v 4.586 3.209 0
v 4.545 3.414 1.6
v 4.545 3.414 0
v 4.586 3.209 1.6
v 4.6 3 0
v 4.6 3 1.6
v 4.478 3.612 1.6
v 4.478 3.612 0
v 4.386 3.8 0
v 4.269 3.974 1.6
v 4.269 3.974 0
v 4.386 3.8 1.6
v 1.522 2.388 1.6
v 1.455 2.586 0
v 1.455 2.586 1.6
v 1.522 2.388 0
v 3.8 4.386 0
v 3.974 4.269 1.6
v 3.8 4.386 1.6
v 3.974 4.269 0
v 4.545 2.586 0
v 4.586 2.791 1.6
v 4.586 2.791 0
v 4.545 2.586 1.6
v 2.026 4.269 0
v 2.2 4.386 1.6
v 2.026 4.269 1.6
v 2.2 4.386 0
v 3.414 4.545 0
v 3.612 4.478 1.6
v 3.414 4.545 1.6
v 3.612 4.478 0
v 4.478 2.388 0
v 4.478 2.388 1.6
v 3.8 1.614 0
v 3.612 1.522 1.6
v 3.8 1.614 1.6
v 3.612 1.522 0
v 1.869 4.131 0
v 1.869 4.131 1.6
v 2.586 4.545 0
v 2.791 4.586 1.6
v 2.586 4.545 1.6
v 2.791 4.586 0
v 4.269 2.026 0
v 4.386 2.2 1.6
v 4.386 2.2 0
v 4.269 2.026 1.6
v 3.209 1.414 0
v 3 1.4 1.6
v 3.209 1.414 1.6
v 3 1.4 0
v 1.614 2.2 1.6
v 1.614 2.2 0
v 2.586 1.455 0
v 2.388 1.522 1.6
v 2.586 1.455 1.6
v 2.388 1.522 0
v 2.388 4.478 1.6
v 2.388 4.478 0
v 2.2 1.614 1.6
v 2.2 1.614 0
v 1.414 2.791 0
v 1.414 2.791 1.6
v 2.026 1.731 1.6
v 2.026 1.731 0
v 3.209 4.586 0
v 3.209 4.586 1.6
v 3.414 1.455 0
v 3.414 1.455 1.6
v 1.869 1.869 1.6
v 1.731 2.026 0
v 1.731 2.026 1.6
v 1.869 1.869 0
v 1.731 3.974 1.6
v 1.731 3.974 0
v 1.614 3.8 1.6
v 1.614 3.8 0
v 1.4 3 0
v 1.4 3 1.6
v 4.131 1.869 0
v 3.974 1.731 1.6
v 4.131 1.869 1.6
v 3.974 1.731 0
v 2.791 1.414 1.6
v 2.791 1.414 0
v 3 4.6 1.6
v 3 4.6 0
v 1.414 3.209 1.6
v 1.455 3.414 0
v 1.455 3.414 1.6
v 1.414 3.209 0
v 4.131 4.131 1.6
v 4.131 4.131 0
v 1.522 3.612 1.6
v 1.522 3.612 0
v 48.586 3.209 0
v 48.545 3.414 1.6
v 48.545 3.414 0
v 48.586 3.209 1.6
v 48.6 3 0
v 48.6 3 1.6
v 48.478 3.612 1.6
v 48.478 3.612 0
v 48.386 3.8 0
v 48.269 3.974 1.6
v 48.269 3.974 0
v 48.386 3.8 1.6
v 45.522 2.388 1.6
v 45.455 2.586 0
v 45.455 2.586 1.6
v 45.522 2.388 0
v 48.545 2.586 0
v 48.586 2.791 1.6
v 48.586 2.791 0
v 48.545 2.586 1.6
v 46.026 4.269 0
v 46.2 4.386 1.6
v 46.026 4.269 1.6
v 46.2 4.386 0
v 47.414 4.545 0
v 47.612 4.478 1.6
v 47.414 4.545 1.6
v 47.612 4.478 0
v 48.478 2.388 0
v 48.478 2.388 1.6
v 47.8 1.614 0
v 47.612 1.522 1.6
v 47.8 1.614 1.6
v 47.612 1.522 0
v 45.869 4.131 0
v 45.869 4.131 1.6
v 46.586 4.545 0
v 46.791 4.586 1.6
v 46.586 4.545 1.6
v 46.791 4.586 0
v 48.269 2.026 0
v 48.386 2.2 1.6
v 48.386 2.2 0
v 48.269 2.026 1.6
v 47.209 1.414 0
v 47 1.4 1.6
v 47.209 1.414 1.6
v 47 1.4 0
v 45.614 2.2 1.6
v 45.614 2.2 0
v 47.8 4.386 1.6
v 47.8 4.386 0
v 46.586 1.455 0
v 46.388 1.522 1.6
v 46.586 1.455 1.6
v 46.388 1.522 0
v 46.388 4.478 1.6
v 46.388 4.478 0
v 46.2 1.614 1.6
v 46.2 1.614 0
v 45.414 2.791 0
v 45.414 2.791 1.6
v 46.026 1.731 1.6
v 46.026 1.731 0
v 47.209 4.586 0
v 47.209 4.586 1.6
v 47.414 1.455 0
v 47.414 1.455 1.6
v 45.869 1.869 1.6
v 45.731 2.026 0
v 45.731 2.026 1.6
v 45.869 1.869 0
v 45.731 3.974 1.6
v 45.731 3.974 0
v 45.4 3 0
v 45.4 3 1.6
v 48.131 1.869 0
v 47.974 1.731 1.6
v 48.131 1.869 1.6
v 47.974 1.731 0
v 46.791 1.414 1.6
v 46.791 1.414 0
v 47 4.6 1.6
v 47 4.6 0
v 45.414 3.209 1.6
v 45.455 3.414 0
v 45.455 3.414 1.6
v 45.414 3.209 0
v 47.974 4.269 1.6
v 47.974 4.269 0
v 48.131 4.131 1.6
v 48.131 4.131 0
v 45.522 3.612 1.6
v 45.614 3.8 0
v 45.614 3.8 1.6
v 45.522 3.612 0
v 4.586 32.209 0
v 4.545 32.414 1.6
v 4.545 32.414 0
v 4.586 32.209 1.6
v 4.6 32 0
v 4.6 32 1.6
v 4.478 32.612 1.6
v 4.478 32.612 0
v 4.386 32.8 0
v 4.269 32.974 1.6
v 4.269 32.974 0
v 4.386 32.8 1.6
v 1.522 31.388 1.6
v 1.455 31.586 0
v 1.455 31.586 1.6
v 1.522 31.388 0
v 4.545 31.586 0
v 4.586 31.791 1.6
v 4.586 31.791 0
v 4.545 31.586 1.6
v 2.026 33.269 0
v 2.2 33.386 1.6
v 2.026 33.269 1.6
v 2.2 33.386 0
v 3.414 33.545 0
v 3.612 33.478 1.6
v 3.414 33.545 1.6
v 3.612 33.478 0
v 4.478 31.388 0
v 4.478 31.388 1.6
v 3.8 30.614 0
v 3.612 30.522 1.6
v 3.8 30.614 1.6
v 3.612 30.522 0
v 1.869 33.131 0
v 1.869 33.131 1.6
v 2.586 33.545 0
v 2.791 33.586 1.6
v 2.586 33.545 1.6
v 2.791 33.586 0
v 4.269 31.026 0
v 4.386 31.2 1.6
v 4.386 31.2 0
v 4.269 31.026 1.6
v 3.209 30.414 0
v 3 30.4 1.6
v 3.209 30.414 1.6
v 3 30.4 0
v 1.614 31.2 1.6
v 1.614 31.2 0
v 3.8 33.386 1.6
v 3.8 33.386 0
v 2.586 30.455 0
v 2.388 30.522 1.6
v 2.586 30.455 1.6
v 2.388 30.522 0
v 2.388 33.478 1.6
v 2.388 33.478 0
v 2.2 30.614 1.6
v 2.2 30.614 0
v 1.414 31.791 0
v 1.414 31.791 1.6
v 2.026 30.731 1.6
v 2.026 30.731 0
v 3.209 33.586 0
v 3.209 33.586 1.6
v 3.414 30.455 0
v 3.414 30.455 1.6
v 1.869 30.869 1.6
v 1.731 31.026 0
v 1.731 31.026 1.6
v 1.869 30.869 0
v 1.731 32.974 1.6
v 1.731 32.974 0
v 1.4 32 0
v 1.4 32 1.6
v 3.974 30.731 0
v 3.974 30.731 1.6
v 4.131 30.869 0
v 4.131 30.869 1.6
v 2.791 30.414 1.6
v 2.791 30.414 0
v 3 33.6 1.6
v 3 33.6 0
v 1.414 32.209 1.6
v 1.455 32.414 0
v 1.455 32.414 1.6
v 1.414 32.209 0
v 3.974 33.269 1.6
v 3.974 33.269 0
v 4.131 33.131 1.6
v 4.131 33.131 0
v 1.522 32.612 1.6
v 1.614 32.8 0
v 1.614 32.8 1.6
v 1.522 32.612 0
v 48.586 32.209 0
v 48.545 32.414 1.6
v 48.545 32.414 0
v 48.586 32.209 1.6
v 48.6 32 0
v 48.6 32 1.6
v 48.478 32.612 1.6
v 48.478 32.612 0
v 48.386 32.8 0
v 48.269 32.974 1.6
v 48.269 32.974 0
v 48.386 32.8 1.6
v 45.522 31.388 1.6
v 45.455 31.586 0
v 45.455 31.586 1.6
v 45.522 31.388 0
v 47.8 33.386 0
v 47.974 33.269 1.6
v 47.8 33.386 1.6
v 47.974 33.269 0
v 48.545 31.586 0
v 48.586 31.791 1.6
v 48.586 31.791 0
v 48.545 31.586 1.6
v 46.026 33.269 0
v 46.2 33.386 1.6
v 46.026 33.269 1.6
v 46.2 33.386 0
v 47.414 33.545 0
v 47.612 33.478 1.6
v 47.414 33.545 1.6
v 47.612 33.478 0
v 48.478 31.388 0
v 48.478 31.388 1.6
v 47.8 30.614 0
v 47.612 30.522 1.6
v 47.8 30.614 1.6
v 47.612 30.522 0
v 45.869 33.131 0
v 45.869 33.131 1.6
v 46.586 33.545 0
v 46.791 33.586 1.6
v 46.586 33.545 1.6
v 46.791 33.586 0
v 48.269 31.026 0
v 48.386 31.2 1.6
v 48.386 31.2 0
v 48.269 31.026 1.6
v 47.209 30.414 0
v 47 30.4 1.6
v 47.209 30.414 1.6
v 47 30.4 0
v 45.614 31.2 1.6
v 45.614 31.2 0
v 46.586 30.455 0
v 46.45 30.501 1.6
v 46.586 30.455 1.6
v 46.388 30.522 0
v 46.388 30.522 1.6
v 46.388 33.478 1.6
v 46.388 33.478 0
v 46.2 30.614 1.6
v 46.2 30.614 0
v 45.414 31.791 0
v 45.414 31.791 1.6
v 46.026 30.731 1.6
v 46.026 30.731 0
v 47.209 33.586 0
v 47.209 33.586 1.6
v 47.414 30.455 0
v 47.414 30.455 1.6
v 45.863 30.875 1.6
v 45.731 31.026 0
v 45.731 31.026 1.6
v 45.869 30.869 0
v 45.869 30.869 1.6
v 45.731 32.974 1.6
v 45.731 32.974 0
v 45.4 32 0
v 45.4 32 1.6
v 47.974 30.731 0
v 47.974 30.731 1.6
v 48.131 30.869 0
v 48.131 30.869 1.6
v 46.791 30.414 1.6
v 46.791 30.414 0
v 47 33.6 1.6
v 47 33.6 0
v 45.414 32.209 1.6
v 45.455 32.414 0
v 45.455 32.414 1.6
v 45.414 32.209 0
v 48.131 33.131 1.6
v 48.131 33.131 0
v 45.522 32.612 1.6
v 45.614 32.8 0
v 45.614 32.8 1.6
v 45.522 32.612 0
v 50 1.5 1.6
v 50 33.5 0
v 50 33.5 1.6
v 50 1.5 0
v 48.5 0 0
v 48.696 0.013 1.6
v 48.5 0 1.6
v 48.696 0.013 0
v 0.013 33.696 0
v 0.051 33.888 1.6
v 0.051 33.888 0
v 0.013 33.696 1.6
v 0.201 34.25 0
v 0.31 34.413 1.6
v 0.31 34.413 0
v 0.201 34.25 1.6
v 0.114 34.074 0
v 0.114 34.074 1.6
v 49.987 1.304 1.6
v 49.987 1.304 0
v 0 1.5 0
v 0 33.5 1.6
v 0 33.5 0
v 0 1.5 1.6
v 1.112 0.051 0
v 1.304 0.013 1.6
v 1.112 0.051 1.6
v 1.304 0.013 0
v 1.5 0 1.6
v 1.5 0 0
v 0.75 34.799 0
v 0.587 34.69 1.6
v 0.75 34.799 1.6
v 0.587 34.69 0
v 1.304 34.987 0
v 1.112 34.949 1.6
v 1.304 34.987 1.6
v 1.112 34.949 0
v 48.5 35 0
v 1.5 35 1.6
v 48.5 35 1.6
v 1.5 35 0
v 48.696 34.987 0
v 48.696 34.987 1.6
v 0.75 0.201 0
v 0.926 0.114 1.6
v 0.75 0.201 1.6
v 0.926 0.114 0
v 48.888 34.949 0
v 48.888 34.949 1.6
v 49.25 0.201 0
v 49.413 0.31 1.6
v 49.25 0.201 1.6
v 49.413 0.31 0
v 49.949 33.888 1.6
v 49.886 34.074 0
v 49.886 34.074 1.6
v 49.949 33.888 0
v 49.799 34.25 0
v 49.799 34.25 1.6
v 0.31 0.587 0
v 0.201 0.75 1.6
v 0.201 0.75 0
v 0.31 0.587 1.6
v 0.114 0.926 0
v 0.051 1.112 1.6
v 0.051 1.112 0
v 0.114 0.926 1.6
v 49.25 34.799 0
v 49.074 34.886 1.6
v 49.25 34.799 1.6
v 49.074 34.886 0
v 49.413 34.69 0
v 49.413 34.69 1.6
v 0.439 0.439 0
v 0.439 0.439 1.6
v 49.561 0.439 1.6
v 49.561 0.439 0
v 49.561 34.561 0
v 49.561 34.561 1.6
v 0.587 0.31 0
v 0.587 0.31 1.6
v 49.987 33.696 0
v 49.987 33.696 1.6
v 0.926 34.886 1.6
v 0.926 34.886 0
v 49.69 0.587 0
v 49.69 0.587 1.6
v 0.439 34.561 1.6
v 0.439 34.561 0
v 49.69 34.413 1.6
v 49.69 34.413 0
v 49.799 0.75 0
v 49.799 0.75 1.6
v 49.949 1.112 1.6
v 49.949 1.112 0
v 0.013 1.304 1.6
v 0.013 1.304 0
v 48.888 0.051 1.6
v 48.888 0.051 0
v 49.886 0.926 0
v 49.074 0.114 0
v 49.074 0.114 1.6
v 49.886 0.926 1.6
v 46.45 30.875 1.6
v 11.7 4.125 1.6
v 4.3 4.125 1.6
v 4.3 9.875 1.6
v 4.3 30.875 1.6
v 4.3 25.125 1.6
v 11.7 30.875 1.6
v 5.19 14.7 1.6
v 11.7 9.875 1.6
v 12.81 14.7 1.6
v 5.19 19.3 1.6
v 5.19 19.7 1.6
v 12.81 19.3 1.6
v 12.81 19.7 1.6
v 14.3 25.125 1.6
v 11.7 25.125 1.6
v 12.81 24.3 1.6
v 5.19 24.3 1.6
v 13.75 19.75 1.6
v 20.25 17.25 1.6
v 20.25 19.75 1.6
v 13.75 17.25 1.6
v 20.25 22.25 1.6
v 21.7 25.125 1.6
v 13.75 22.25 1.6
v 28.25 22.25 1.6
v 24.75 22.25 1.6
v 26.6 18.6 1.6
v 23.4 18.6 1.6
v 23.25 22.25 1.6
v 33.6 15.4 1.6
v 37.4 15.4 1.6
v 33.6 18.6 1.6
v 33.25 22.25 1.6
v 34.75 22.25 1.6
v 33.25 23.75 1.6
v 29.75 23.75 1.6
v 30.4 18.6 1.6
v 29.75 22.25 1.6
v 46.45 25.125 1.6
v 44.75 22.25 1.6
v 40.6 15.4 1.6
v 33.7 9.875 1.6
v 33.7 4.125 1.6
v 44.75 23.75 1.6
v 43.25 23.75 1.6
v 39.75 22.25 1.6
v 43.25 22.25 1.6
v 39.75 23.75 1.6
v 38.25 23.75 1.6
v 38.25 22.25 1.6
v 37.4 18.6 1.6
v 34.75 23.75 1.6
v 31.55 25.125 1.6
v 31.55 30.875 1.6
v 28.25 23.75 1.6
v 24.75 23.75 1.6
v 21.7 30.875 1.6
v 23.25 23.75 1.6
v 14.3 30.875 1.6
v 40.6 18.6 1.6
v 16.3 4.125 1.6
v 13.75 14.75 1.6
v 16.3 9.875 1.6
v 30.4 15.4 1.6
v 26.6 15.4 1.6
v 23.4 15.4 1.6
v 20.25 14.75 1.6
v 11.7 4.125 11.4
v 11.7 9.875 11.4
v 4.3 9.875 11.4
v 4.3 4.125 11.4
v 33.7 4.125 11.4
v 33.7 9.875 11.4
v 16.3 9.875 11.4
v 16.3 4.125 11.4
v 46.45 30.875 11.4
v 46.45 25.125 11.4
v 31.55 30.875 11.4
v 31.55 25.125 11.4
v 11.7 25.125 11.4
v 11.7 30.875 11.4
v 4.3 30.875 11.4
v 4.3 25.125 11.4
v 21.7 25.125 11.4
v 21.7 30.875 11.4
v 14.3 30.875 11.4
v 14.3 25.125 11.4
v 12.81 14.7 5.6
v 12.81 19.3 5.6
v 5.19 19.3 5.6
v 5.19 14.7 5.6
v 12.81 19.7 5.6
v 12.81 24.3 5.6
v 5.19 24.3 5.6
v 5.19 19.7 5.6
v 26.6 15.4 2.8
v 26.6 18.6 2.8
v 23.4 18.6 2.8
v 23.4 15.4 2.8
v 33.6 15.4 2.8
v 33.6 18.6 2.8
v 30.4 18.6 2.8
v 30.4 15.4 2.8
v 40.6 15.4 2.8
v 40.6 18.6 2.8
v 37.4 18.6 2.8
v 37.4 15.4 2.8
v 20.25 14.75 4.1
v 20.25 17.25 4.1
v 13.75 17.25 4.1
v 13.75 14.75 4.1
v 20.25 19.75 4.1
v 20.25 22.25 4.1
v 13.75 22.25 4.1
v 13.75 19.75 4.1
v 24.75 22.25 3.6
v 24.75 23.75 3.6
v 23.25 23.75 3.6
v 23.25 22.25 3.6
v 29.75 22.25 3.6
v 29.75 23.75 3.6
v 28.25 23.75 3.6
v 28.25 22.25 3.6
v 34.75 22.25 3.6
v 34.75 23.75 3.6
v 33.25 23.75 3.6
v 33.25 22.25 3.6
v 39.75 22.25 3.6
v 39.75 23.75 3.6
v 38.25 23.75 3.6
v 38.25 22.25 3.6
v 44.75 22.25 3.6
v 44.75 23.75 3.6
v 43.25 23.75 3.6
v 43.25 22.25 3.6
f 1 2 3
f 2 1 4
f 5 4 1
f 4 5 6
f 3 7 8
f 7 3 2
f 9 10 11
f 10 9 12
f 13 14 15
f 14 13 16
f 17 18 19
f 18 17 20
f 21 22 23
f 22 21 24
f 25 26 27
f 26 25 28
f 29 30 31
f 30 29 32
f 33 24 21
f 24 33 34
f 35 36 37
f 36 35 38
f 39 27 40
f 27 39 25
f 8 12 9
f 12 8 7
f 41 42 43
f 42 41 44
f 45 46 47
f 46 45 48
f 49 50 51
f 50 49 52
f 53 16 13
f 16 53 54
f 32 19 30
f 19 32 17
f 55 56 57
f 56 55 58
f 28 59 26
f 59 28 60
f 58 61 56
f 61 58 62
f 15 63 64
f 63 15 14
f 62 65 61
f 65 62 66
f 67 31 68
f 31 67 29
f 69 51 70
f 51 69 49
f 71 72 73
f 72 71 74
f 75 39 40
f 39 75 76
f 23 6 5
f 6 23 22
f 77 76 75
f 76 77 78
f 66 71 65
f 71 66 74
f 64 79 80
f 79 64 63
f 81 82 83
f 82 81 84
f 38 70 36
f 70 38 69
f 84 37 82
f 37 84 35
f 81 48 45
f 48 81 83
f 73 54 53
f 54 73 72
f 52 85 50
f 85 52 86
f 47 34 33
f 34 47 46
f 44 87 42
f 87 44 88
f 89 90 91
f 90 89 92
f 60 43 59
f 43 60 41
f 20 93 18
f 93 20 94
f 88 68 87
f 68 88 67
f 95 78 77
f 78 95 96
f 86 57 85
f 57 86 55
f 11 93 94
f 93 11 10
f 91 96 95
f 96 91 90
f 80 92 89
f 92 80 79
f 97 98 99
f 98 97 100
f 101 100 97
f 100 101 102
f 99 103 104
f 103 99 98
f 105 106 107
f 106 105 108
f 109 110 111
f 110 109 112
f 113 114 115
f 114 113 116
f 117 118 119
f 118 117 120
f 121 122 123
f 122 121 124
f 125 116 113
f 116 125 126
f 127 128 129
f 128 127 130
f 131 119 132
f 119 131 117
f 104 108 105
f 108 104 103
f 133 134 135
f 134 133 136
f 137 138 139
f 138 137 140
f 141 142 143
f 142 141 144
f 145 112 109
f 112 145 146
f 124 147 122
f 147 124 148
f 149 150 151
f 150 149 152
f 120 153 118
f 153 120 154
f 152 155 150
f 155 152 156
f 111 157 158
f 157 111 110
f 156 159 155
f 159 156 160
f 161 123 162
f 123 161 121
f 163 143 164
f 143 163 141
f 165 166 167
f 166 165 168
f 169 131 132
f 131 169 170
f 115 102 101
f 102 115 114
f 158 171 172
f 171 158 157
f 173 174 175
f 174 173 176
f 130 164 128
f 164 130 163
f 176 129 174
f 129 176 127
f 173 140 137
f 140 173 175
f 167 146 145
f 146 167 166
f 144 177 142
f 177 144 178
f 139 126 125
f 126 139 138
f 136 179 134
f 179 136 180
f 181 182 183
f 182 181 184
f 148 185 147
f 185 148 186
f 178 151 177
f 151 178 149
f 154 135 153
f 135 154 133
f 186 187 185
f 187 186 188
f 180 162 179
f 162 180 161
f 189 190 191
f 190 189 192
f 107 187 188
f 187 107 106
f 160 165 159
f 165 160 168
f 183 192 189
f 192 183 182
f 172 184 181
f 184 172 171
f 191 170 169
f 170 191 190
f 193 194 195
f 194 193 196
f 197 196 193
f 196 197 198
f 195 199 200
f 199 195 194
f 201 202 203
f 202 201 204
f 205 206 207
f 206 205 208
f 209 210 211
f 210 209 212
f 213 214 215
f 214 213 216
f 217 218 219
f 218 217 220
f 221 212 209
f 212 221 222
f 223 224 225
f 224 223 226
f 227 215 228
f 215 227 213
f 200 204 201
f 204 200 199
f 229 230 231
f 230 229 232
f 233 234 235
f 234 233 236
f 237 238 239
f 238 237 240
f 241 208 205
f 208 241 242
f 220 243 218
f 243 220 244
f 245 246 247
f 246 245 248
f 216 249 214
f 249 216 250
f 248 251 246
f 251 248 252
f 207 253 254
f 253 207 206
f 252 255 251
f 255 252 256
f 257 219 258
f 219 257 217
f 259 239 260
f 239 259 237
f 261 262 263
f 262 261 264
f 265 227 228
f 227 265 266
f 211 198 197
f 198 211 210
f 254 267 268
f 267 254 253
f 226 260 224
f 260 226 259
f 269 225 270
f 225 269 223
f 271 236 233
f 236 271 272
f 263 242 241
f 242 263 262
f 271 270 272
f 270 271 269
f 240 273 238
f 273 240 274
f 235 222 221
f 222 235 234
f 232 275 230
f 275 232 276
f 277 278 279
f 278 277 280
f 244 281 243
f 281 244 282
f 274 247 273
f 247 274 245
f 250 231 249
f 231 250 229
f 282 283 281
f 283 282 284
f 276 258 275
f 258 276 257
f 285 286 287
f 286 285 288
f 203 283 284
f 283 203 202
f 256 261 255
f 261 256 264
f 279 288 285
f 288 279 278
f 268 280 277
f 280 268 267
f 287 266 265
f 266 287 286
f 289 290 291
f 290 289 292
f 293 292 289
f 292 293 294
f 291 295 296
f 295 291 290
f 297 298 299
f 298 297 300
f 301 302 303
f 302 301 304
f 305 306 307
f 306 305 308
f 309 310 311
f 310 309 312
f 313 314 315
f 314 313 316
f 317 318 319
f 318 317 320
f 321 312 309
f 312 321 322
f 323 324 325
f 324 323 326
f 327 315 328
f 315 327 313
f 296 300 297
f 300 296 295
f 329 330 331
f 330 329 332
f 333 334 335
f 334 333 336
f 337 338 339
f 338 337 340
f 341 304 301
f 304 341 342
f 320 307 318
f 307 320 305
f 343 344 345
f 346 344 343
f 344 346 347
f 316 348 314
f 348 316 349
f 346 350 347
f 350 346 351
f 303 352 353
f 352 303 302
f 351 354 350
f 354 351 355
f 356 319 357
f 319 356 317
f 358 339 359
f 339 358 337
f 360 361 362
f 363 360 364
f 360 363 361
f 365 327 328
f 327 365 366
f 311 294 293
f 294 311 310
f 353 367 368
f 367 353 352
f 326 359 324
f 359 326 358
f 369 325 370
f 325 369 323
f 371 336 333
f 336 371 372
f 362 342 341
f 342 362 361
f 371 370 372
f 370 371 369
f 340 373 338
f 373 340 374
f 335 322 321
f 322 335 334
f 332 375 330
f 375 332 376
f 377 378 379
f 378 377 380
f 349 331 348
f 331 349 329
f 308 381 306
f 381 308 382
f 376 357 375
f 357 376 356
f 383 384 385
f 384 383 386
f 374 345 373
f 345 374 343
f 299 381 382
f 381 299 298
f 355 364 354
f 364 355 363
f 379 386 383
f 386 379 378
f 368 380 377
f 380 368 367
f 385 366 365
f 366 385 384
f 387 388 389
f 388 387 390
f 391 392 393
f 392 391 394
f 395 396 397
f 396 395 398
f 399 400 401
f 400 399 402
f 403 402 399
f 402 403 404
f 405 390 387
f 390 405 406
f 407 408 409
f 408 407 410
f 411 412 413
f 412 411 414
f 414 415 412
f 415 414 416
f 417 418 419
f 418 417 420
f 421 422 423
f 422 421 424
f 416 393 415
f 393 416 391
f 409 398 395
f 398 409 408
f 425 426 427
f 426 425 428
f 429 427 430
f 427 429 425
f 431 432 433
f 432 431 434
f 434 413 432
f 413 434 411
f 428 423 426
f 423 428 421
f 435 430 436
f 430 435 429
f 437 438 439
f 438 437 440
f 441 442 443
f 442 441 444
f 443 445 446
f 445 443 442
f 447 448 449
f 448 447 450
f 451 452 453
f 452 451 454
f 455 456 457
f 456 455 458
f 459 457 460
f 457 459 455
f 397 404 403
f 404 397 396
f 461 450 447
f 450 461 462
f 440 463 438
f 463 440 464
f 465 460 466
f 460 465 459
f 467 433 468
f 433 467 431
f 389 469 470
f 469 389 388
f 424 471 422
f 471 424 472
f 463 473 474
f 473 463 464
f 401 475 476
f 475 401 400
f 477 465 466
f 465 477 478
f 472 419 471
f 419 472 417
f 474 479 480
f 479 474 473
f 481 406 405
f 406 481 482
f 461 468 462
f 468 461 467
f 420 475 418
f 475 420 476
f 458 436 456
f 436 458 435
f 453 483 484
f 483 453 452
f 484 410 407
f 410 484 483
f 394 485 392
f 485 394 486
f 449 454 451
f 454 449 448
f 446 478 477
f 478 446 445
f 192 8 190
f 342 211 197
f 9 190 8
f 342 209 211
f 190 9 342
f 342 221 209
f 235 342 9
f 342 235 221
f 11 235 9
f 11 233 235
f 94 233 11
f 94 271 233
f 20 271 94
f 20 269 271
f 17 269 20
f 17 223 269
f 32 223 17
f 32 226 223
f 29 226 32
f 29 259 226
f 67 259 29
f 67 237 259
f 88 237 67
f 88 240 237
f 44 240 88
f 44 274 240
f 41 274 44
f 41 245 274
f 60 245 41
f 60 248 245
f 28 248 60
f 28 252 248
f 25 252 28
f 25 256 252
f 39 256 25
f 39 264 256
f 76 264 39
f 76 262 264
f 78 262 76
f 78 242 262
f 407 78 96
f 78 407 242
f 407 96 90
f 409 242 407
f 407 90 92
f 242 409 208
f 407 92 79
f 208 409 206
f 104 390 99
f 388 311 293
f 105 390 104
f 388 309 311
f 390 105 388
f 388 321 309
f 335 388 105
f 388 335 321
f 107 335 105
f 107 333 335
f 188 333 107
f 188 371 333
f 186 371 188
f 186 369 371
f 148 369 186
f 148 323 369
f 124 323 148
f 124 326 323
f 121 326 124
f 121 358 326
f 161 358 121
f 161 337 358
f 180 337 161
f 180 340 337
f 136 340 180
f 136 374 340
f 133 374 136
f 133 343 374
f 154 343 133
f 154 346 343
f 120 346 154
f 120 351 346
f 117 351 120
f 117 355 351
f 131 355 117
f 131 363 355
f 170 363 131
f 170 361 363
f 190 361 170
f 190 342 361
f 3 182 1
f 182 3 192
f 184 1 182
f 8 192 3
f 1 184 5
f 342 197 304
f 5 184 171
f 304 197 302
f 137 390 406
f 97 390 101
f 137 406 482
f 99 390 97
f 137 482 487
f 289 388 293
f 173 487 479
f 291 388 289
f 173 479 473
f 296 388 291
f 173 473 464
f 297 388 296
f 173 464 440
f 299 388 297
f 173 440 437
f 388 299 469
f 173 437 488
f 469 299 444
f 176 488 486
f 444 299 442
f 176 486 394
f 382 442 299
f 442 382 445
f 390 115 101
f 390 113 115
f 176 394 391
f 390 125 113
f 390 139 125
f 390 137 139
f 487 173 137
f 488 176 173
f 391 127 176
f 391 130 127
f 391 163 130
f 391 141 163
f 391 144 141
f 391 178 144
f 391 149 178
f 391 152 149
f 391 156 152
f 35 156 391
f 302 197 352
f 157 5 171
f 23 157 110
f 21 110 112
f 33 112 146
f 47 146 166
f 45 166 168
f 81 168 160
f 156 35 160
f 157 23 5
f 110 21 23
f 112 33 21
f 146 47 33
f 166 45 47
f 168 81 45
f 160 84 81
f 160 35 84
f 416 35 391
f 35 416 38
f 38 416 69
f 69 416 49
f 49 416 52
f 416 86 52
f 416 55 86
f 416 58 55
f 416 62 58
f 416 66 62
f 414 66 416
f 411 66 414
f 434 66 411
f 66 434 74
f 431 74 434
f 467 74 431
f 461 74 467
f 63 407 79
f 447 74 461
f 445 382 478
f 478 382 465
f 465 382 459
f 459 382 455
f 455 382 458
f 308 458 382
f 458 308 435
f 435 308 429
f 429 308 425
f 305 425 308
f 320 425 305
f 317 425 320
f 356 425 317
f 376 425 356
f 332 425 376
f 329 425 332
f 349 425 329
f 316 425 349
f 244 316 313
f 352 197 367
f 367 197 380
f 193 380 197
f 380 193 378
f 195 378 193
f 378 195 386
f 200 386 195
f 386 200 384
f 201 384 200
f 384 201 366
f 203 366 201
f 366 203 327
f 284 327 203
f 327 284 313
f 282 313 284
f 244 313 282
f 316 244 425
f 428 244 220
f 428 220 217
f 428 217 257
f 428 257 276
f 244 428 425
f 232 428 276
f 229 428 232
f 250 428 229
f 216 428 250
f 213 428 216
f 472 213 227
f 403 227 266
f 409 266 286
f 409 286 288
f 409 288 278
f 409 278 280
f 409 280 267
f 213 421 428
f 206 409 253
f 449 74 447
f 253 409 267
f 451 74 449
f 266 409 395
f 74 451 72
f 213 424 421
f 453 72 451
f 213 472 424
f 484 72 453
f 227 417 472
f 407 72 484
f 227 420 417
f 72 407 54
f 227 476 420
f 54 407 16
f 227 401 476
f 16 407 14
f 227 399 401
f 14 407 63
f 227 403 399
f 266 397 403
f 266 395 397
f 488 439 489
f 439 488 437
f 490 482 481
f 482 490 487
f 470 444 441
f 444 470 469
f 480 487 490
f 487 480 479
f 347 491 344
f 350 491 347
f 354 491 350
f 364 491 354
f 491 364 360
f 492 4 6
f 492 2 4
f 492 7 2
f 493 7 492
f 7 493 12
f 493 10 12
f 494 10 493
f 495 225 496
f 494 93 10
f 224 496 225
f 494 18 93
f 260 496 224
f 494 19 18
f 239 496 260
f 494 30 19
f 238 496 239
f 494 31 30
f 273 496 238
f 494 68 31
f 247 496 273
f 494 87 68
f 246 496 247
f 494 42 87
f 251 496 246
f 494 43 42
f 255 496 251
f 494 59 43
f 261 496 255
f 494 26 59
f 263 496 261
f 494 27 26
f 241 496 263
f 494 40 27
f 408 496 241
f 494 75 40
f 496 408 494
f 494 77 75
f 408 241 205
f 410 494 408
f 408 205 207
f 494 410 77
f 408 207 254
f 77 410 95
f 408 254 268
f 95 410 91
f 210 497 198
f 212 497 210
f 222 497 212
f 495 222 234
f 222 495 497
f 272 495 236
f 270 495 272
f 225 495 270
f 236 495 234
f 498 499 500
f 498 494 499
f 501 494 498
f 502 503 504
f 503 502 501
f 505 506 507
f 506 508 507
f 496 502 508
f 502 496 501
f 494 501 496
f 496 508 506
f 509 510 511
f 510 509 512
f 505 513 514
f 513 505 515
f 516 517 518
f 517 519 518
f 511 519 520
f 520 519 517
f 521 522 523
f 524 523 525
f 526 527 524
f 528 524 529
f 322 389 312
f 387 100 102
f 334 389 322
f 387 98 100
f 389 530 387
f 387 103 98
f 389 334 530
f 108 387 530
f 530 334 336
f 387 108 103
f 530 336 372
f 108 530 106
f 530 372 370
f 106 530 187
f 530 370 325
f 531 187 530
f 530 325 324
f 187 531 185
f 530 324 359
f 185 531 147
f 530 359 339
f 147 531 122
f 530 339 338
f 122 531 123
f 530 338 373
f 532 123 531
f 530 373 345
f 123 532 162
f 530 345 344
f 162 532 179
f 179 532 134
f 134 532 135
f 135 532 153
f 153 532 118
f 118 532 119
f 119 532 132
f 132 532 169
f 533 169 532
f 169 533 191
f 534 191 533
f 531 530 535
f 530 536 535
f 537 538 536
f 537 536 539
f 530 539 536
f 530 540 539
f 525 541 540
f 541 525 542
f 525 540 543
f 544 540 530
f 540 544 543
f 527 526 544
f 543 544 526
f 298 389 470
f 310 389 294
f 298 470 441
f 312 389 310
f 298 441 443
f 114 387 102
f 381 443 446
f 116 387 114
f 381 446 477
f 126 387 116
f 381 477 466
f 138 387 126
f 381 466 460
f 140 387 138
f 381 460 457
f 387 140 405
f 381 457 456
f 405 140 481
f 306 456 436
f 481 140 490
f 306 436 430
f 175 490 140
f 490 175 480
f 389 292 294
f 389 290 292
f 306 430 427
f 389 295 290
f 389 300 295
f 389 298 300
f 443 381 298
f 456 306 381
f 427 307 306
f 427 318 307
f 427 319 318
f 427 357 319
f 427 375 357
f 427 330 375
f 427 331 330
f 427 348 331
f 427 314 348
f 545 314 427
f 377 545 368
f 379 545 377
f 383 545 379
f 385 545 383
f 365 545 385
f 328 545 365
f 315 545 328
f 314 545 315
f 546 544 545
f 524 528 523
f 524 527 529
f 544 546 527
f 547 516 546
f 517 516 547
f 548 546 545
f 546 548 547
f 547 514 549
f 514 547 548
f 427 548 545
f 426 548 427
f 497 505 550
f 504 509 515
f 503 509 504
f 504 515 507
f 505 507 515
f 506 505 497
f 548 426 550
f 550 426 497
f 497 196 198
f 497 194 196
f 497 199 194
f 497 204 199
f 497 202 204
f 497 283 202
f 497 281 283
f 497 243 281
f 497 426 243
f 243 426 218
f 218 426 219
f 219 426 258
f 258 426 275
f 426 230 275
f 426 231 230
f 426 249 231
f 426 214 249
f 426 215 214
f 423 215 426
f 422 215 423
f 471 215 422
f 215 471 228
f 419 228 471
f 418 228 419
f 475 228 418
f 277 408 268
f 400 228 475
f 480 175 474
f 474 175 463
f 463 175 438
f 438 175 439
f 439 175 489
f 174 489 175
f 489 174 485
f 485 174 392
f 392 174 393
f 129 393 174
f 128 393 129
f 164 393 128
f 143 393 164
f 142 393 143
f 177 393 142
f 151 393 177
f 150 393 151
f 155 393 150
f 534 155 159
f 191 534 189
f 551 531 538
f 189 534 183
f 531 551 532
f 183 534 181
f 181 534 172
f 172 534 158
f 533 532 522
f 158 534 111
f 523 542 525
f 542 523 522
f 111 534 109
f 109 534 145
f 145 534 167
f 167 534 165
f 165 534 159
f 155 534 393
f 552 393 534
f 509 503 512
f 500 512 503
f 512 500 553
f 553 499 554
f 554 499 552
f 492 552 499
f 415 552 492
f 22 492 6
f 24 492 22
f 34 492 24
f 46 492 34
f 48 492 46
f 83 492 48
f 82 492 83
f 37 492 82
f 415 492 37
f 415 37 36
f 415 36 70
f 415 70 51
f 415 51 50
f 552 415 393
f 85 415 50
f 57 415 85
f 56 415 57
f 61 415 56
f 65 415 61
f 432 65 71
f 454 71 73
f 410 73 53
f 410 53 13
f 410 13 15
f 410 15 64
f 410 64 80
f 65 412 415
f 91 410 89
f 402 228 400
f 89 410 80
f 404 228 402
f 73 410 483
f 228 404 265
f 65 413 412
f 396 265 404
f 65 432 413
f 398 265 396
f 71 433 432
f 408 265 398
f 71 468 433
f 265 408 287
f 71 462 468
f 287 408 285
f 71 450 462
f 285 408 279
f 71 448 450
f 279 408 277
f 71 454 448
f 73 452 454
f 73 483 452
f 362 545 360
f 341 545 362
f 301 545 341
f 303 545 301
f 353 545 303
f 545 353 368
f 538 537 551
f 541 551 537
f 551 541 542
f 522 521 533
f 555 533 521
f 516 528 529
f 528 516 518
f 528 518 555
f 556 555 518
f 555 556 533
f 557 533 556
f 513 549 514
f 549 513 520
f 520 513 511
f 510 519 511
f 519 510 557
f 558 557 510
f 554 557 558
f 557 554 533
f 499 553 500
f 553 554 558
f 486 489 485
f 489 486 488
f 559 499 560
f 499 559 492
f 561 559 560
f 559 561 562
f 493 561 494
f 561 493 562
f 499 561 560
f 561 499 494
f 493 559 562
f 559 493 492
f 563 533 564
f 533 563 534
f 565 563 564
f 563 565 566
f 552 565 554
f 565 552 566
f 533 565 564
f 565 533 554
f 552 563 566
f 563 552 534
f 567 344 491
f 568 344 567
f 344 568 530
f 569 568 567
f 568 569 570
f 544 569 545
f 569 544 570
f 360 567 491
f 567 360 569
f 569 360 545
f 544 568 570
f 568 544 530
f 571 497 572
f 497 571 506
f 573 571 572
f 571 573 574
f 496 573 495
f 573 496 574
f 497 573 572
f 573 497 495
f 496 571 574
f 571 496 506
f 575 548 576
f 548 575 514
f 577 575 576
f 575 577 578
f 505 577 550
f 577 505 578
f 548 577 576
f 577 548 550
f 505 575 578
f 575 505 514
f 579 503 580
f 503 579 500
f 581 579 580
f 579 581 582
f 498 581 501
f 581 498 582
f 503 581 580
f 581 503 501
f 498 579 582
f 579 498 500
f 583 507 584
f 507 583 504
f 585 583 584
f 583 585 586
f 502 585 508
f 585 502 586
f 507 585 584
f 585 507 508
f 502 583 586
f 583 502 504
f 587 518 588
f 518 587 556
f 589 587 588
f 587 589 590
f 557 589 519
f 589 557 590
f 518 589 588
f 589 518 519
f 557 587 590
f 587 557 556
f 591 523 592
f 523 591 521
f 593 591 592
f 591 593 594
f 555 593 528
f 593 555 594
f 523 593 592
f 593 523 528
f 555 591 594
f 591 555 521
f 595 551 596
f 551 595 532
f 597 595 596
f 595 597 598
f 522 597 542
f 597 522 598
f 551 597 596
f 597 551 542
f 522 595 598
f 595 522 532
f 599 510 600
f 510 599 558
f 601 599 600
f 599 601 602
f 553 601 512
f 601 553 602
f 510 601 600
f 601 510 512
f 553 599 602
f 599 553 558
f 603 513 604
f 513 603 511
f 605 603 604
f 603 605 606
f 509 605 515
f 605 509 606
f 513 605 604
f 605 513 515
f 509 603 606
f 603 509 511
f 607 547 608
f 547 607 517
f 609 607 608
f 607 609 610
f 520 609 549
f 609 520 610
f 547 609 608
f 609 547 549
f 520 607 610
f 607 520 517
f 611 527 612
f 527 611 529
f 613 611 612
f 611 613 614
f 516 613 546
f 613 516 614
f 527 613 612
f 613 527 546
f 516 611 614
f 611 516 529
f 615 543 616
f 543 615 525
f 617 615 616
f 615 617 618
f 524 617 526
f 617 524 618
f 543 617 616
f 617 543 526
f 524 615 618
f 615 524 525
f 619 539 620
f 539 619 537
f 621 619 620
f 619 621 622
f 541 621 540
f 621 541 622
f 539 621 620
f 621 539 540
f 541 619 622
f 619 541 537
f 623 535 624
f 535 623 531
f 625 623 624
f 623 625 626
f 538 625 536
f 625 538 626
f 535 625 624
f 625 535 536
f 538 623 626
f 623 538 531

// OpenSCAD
// Stage 19 pre-CAD mechanical envelope only.
// No copper, footprint, creepage, DRC or fabrication release is implied.

$fn = 48;

board_x = 50;
board_y = 35;
board_z = 1.6;
hole_d = 3.2;
holes = [[3, 3], [47, 3], [3, 32], [47, 32]];

module rounded_board() {
  difference() {
    linear_extrude(board_z)
      offset(r = 1.5)
        offset(delta = -1.5)
          square([board_x, board_y]);
    for (p = holes)
      translate([p[0], p[1], -0.1]) cylinder(d = hole_d, h = board_z + 0.2);
  }
}

module block(x, y, sx, sy, sz, label_kind = 0) {
  translate([x - sx / 2, y - sy / 2, board_z]) cube([sx, sy, sz]);
}

color([0.03, 0.28, 0.16]) rounded_board();

// JST XH top-entry connector envelopes; 9.8 mm mounting height above PCB.
color([0.92, 0.92, 0.82]) {
  block(8, 7, 7.4, 5.75, 9.8);   // J1 B2B-XH-A
  block(25, 7, 17.4, 5.75, 9.8); // J2 B6B-XH-A
  block(39, 28, 14.9, 5.75, 9.8); // J3 B5B-XH-A
  block(8, 28, 7.4, 5.75, 9.8);  // J4 B2B-XH-A
  block(18, 28, 7.4, 5.75, 9.8); // J5 B2B-XH-A
}

// Optocoupler and logic-package placement envelopes.
color([0.12, 0.12, 0.14]) {
  block(9, 17, 7.62, 4.6, 4.0); // U1 VO617A-4
  block(9, 22, 7.62, 4.6, 4.0); // U2 VO617A-4
  block(25, 17, 3.2, 3.2, 1.2); // U3 VSSOP-8
  block(32, 17, 3.2, 3.2, 1.2); // U4 VSSOP-8
  block(39, 17, 3.2, 3.2, 1.2); // U5 VSSOP-8
}

// Two 0.5 W input resistors and test-point corridor.
color([0.72, 0.42, 0.12]) {
  block(17, 16, 6.5, 2.5, 2.5);
  block(17, 21, 6.5, 2.5, 2.5);
}
color([0.8, 0.65, 0.1]) {
  for (x = [24, 29, 34, 39, 44]) block(x, 23, 1.5, 1.5, 2.0);
}
